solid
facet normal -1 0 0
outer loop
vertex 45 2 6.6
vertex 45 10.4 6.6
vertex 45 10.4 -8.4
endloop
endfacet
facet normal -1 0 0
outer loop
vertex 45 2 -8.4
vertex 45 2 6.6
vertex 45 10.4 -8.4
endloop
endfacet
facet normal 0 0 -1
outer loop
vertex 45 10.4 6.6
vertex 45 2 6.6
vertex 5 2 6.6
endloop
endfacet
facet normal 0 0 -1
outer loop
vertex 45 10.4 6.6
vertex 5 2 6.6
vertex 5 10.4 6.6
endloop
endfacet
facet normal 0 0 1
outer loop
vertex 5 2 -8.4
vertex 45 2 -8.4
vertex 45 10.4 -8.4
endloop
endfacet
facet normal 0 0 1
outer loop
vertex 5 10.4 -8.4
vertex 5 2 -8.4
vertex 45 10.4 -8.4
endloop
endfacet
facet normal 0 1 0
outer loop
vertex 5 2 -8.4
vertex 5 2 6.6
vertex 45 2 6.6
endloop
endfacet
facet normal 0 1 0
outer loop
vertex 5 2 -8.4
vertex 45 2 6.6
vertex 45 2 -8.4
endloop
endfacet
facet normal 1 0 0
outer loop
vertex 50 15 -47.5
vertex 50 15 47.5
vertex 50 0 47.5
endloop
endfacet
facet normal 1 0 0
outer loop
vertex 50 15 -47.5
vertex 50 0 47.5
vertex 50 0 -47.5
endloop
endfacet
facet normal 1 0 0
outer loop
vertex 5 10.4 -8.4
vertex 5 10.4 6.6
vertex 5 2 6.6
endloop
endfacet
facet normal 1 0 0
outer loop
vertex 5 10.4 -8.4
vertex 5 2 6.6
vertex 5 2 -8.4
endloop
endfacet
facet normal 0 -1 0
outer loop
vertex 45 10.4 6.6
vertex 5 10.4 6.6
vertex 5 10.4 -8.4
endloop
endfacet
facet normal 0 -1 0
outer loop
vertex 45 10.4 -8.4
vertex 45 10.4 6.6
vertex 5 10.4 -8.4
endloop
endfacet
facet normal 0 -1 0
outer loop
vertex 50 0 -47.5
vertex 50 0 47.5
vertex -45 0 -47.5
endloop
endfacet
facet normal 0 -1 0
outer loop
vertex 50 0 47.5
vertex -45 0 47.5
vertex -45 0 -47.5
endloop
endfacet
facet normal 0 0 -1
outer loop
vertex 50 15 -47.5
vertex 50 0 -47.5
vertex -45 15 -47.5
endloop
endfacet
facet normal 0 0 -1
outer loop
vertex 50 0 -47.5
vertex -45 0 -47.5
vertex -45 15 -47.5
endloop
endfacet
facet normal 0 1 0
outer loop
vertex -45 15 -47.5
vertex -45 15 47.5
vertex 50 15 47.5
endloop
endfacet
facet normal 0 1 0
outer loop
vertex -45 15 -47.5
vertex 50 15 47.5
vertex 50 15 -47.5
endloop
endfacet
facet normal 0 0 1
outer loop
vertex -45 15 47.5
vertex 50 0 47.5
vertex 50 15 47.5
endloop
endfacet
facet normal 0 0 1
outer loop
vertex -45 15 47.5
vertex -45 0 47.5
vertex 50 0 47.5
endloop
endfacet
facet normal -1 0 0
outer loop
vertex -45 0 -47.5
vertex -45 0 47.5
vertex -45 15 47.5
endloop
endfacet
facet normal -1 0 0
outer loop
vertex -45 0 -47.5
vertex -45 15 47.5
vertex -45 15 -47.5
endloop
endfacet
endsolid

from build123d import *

# Parameters (mm, degrees)
SKETCH1_W           = 90
SKETCH1_H           = 95
BOSS_EXTRUDE3_DEPTH = 15
SKETCH5_W           = 15
SKETCH5_H           = 8.4
CUT_EXTRUDE3_DEPTH  = 40
SKETCH7_W           = 95
SKETCH7_H           = 15
BOSS_EXTRUDE4_DEPTH = 5


with BuildPart() as part:
    # Sketch1 → Boss-Extrude3 (new body)
    with BuildSketch(Plane(origin=(0, 0, 0), x_dir=(1, 0, 0), z_dir=(0, 1, 0))):
        Rectangle(SKETCH1_W, SKETCH1_H)
    extrude(amount=BOSS_EXTRUDE3_DEPTH)

    # Sketch5 → Cut-Extrude3 (cut)
    with BuildSketch(Plane(origin=(45, 0, 0), x_dir=(0, 0, -1), z_dir=(1, 0, 0))):
        with Locations((0.9, 6.2)):
            Rectangle(SKETCH5_W, SKETCH5_H)
    extrude(amount=-CUT_EXTRUDE3_DEPTH, mode=Mode.SUBTRACT)

    # Sketch7 → Boss-Extrude4 (add)
    with BuildSketch(Plane(origin=(45, 0, 0), x_dir=(0, 0, -1), z_dir=(1, 0, 0))):
        with Locations((0, 7.5)):
            Rectangle(SKETCH7_W, SKETCH7_H)
    extrude(amount=BOSS_EXTRUDE4_DEPTH)


solid = part.part
